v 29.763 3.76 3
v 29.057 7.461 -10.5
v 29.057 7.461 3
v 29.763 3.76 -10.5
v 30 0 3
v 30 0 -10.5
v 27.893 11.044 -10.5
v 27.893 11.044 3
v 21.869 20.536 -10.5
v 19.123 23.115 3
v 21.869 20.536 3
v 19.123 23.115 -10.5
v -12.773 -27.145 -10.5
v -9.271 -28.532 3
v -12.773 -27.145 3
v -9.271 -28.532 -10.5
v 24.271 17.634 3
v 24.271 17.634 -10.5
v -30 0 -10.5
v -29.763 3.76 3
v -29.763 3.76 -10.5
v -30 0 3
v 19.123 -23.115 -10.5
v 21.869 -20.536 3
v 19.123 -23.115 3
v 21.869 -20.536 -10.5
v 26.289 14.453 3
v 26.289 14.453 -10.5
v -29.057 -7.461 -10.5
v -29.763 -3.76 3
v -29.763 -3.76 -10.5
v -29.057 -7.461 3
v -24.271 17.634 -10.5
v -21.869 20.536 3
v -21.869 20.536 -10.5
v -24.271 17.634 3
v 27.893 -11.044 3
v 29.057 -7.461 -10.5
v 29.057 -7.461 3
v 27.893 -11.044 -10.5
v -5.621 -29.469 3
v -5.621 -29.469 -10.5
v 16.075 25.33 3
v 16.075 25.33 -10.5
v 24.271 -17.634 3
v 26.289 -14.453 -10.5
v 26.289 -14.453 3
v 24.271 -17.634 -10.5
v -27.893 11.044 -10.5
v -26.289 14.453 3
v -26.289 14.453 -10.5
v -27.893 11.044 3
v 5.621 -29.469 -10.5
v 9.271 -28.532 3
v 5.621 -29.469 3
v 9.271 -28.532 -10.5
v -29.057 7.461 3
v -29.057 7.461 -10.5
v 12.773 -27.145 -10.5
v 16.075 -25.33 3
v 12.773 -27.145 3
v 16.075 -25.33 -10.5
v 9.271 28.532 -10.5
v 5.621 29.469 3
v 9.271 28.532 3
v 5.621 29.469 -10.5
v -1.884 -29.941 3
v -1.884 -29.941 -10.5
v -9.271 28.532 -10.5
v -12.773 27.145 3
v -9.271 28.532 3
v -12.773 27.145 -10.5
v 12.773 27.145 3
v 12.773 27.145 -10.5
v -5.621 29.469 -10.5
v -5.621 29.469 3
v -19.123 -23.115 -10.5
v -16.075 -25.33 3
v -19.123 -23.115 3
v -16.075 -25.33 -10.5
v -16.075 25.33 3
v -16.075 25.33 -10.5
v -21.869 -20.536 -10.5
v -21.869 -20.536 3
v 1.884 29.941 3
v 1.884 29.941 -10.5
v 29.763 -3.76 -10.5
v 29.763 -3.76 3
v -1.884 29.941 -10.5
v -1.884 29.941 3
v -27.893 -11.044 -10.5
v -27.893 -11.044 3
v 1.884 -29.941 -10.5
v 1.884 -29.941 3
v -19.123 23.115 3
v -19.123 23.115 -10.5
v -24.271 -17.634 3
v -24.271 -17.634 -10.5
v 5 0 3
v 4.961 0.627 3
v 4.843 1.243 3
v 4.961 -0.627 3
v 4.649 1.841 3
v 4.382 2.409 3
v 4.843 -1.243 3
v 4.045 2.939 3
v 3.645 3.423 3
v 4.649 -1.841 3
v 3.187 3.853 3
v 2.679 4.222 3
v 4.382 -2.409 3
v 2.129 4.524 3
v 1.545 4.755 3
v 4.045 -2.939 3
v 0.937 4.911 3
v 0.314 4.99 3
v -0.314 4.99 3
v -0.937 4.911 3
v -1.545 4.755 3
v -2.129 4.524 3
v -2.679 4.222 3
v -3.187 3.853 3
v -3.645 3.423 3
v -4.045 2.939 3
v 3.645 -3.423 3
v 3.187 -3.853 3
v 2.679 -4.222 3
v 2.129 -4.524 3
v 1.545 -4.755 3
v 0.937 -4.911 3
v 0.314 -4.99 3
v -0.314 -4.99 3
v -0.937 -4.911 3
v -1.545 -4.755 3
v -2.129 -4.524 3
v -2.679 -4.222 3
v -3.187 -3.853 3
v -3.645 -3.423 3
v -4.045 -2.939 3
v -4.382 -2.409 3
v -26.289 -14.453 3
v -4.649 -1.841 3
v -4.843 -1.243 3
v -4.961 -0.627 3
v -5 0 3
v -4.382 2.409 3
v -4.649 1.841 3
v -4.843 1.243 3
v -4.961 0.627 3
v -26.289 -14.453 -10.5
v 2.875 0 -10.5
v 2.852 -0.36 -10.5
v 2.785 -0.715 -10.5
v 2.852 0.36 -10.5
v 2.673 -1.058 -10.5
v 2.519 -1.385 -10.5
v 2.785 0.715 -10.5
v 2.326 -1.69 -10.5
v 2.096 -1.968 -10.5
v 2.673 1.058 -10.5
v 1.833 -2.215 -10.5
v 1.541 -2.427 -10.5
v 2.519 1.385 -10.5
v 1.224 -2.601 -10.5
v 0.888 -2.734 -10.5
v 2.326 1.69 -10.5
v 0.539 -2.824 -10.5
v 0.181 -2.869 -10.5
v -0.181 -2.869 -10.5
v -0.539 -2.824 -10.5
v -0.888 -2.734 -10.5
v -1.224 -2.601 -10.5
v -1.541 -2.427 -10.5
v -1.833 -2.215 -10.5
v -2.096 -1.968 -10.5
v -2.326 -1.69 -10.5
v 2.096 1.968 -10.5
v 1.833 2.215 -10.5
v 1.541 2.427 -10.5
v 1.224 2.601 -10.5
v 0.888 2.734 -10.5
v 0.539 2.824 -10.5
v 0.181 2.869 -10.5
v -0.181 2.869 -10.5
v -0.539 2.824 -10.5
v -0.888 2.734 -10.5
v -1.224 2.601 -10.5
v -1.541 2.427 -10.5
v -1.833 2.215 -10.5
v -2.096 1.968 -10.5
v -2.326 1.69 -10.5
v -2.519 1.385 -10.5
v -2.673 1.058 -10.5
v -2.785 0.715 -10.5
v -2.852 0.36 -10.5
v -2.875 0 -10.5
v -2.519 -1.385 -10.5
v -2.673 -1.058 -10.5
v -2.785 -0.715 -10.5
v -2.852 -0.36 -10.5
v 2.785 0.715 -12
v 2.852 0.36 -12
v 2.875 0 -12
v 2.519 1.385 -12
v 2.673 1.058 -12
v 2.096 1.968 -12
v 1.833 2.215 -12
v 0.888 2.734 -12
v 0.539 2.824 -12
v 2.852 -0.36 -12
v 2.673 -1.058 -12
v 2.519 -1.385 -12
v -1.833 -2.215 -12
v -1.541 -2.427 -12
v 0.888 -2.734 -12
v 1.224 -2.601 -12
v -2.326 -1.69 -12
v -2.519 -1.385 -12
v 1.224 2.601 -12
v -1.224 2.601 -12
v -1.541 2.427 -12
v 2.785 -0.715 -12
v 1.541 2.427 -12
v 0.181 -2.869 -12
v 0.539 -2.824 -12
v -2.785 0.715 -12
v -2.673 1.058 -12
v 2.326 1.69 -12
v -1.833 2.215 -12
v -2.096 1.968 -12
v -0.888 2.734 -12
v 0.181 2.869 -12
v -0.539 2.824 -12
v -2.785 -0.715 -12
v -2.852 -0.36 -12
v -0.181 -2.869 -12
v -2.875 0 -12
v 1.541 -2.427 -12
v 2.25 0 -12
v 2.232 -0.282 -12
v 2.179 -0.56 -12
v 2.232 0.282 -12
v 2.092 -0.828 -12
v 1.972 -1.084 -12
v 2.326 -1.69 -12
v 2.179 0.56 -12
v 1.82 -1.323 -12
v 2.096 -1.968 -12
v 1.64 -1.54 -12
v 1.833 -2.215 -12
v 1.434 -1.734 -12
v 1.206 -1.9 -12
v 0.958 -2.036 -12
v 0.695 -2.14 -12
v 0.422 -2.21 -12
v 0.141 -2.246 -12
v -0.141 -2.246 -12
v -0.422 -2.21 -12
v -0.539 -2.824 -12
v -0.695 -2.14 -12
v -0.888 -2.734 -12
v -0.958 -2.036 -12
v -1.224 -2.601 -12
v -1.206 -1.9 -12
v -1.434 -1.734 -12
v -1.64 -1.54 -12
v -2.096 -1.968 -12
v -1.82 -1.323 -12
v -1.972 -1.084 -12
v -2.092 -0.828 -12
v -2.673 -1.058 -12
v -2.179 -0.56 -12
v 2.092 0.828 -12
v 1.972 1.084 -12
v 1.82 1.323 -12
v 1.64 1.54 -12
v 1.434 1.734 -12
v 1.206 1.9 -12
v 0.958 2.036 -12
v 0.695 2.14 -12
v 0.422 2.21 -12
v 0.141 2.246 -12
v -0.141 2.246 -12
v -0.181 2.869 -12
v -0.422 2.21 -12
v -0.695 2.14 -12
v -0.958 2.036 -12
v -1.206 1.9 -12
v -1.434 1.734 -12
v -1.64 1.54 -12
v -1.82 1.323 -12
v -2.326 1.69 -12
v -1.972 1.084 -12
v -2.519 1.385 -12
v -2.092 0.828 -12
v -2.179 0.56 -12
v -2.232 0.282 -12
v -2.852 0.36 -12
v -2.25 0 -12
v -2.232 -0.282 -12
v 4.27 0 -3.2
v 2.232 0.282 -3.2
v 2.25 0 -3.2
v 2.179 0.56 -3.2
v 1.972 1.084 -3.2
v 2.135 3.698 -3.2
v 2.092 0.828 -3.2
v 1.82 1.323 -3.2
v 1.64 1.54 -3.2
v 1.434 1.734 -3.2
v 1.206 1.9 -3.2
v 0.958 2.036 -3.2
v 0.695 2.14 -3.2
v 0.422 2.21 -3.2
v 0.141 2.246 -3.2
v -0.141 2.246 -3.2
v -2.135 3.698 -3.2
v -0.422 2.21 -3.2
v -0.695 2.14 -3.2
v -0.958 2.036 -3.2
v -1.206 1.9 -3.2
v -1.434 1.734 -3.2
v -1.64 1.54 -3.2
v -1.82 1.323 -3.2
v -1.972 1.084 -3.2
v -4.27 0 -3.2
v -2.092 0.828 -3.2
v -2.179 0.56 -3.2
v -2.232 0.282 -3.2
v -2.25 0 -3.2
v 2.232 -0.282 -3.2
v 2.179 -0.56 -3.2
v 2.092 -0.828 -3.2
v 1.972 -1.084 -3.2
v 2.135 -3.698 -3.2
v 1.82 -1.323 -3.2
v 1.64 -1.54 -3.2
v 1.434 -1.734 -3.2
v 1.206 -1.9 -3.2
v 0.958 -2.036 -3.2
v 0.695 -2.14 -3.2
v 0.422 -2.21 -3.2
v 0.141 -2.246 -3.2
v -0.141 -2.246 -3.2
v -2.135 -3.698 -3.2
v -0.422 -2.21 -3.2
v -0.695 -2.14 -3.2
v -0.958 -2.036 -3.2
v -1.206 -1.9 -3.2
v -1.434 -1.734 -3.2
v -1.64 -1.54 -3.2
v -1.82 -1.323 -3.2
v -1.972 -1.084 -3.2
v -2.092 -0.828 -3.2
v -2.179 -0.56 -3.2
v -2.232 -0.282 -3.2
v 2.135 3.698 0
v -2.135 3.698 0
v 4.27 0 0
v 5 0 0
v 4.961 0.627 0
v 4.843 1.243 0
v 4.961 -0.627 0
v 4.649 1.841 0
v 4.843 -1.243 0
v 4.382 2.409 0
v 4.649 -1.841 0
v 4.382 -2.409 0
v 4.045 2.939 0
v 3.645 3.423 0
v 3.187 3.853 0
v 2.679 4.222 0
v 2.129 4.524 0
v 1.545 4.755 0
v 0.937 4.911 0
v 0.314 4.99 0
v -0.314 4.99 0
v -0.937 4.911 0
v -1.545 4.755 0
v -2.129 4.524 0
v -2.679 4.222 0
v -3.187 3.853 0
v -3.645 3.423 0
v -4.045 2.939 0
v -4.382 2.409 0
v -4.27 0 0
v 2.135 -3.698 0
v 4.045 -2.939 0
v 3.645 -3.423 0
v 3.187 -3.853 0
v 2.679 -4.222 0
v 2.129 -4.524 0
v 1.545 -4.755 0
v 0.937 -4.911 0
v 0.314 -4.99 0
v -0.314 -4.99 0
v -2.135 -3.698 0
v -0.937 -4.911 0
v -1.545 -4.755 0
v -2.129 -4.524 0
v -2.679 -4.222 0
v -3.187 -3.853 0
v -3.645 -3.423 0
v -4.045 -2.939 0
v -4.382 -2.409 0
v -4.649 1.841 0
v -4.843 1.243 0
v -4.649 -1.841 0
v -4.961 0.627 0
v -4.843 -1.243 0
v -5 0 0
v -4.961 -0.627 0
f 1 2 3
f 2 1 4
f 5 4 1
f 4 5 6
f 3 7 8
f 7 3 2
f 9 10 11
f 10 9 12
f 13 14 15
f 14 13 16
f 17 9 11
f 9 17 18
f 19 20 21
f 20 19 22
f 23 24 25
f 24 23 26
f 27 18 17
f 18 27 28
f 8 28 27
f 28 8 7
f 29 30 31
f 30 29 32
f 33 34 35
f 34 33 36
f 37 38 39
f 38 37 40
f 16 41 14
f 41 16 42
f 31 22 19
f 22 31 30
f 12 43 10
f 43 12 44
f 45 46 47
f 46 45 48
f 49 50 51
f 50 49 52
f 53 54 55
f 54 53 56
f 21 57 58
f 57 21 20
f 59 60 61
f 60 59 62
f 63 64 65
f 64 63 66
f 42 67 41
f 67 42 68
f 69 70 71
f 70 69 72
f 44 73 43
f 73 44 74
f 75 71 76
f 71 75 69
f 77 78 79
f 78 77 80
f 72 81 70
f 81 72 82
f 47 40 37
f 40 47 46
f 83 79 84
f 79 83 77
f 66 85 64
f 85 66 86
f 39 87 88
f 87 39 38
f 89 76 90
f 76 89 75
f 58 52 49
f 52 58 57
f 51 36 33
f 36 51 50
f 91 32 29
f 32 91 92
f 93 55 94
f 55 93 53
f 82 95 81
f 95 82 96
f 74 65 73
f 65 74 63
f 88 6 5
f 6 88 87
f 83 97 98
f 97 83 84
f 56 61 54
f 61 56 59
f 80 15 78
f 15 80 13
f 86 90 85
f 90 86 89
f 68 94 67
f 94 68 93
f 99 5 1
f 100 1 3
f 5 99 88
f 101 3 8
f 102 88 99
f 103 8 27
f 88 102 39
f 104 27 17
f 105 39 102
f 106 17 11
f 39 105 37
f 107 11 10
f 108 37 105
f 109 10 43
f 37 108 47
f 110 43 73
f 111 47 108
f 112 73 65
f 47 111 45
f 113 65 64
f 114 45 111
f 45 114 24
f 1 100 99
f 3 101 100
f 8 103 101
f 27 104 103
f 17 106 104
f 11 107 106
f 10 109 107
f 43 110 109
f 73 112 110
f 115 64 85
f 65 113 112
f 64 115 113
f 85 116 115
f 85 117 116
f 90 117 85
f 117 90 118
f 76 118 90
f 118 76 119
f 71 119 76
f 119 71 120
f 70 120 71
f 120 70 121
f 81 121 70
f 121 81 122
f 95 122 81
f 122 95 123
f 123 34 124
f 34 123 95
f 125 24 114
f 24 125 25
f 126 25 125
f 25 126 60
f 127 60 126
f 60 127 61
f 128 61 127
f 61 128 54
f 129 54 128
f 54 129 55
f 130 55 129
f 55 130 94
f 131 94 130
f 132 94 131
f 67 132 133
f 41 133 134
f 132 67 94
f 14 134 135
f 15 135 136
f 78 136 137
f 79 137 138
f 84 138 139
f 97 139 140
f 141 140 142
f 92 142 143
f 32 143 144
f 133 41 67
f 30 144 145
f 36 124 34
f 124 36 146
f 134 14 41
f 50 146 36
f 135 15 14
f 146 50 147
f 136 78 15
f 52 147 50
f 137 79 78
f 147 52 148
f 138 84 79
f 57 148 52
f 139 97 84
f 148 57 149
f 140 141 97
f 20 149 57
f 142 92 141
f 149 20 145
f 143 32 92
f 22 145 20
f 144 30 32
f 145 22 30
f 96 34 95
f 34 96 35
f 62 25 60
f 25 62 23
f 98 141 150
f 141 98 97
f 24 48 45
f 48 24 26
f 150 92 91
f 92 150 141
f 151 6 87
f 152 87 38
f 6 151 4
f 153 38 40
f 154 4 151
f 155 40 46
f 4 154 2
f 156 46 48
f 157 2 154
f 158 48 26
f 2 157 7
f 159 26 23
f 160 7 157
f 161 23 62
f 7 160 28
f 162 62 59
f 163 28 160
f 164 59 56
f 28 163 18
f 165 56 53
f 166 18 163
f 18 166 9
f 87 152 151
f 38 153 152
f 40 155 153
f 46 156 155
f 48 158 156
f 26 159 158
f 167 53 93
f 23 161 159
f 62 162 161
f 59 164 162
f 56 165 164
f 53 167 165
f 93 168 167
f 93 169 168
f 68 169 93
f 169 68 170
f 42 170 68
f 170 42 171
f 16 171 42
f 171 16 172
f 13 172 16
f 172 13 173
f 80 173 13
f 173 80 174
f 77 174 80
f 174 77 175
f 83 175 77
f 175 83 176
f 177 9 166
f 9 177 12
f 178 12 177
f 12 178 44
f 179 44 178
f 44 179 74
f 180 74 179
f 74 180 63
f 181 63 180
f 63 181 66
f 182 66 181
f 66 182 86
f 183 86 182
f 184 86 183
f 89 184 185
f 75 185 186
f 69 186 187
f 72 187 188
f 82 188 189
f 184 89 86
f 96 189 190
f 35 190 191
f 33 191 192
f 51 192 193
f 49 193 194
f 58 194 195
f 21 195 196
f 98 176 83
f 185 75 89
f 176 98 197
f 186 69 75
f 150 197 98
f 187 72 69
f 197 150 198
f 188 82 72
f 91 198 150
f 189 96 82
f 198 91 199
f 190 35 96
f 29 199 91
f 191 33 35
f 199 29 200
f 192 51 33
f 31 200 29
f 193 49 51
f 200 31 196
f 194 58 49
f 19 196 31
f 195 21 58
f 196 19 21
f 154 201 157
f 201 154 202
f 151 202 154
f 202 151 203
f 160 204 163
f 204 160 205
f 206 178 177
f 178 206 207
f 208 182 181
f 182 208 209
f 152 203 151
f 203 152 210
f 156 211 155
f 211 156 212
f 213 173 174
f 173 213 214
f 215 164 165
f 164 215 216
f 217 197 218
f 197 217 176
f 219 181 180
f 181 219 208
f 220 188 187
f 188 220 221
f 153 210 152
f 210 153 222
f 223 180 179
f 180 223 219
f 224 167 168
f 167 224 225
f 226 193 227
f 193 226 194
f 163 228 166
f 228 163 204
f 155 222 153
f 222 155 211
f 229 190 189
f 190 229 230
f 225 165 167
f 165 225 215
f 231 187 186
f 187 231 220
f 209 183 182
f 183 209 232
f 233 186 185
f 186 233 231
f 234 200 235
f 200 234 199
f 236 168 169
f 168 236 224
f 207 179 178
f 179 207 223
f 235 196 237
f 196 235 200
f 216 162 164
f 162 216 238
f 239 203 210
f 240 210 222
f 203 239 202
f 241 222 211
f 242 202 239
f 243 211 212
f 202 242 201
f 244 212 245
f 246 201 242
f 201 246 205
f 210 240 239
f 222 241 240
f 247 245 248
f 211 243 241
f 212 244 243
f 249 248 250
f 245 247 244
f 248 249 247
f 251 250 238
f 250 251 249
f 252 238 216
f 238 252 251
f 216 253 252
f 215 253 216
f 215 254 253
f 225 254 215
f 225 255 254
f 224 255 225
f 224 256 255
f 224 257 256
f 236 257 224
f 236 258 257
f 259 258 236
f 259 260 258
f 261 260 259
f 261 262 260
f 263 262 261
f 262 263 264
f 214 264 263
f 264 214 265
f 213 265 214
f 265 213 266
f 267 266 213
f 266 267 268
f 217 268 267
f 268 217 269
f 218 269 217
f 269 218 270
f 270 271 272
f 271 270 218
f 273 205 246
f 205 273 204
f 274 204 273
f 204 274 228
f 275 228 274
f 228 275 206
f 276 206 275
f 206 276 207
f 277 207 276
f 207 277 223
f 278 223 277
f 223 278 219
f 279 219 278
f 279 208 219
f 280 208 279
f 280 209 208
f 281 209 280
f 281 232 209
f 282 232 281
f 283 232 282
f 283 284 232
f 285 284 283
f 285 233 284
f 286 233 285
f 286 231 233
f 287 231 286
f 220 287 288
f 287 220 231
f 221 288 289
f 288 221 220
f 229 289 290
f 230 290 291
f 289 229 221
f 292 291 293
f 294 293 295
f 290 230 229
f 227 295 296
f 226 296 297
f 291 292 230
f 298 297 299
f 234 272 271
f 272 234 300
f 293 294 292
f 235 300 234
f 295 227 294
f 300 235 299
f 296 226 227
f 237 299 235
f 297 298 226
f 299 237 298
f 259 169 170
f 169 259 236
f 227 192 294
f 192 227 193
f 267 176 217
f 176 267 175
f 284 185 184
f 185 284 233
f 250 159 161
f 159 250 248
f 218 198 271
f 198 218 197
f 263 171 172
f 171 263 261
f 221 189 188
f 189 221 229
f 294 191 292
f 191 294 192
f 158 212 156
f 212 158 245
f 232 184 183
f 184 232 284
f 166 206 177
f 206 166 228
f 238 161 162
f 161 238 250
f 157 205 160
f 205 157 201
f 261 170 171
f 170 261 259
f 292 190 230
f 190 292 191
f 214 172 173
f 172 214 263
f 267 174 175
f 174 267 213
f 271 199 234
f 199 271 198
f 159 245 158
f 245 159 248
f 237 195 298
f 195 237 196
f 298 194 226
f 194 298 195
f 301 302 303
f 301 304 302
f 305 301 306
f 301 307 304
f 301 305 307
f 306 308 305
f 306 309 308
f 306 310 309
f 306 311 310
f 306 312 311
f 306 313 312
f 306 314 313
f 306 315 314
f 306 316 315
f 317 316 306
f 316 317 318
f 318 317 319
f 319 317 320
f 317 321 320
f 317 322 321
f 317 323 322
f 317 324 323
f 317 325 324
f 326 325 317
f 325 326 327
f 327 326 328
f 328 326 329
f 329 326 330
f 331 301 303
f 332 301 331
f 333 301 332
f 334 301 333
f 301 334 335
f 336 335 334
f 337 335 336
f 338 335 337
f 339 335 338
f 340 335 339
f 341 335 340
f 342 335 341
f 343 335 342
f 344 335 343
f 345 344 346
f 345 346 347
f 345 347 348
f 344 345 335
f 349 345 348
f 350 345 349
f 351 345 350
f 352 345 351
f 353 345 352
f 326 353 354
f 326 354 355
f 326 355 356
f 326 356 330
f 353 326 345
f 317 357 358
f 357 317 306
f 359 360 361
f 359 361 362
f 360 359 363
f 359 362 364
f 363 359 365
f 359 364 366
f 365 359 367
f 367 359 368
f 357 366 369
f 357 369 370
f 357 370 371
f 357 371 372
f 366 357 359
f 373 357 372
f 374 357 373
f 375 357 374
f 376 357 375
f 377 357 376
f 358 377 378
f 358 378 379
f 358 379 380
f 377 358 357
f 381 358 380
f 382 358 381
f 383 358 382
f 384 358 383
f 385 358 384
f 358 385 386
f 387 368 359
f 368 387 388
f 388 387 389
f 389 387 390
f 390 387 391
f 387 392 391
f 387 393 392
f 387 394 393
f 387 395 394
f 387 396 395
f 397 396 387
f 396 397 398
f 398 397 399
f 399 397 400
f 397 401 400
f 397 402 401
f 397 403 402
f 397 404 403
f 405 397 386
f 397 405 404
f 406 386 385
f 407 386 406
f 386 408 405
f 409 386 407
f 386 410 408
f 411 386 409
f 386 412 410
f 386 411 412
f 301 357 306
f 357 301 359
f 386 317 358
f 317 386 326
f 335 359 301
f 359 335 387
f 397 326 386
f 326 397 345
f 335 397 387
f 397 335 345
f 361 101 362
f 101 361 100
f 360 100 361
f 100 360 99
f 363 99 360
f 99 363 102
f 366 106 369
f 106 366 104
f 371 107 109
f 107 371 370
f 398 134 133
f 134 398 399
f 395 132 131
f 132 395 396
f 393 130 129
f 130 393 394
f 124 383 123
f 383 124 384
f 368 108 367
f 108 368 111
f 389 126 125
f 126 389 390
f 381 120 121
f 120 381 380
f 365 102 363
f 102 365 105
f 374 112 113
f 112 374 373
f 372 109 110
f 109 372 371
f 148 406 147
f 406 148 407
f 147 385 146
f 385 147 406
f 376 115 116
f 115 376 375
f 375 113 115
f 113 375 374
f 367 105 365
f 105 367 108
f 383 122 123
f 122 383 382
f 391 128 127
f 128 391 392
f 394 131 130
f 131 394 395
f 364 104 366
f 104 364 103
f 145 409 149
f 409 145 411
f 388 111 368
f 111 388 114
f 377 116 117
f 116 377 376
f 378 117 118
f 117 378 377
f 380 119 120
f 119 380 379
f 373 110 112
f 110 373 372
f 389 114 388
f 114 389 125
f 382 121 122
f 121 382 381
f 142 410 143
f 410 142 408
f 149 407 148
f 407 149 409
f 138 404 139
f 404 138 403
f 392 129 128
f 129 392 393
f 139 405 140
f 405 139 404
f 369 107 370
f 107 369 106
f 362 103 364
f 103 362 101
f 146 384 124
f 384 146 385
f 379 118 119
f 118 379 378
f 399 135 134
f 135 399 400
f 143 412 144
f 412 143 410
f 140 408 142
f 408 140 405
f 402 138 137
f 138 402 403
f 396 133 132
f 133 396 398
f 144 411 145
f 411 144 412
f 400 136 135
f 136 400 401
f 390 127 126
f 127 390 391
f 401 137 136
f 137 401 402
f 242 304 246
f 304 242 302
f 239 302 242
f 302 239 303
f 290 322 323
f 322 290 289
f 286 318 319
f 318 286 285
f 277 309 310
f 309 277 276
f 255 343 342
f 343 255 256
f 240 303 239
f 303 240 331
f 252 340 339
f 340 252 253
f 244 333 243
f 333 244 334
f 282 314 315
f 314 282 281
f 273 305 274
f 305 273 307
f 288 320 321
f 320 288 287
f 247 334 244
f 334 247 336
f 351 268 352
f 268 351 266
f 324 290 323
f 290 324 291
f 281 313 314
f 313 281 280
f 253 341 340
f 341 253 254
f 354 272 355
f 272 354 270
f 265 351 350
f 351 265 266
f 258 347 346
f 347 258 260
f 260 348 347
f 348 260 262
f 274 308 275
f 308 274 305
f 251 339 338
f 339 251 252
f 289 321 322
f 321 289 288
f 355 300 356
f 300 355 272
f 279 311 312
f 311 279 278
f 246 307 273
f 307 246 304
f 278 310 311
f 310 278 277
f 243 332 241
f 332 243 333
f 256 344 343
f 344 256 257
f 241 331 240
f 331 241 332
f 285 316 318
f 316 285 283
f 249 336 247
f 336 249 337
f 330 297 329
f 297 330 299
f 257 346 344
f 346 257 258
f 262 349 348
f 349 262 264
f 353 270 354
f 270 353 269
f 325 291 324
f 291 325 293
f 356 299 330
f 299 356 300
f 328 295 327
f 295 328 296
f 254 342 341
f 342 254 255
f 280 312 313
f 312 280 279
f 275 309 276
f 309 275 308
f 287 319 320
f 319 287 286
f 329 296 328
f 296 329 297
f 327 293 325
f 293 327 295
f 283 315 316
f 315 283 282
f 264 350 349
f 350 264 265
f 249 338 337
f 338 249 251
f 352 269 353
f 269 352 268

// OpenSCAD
$fn = 50;

difference() {
	union() {
		translate(v = [0, 0, -10.5]) {
			cylinder(h = 13.5, r = 30.0);
		}
		#translate(v = [0, 0, -12.0]) {
			cylinder(h = 12, r = 2.875);
		}
	}
	union() {
		translate(v = [0, 0, 0]) {
			rotate(a = [0, 0, 0]) {
				difference() {
					union() {
						translate(v = [0, 0, -3.2]) {
							linear_extrude(height = 3.2) {
								polygon(points = [[4.2698, 0.0], [2.1349000000000005, 3.697755269078796], [-2.134899999999999, 3.6977552690787965], [-4.2698, 5.228996902999369e-16], [-2.134900000000002, -3.6977552690787956], [2.1348999999999974, -3.697755269078798]]);
							}
						}
					}
					union();
				}
			}
		}
		#cylinder(h = 3, r = 5.0);
		#translate(v = [0, 0, -100.0]) {
			cylinder(h = 200, r = 2.25);
		}
	}
}
